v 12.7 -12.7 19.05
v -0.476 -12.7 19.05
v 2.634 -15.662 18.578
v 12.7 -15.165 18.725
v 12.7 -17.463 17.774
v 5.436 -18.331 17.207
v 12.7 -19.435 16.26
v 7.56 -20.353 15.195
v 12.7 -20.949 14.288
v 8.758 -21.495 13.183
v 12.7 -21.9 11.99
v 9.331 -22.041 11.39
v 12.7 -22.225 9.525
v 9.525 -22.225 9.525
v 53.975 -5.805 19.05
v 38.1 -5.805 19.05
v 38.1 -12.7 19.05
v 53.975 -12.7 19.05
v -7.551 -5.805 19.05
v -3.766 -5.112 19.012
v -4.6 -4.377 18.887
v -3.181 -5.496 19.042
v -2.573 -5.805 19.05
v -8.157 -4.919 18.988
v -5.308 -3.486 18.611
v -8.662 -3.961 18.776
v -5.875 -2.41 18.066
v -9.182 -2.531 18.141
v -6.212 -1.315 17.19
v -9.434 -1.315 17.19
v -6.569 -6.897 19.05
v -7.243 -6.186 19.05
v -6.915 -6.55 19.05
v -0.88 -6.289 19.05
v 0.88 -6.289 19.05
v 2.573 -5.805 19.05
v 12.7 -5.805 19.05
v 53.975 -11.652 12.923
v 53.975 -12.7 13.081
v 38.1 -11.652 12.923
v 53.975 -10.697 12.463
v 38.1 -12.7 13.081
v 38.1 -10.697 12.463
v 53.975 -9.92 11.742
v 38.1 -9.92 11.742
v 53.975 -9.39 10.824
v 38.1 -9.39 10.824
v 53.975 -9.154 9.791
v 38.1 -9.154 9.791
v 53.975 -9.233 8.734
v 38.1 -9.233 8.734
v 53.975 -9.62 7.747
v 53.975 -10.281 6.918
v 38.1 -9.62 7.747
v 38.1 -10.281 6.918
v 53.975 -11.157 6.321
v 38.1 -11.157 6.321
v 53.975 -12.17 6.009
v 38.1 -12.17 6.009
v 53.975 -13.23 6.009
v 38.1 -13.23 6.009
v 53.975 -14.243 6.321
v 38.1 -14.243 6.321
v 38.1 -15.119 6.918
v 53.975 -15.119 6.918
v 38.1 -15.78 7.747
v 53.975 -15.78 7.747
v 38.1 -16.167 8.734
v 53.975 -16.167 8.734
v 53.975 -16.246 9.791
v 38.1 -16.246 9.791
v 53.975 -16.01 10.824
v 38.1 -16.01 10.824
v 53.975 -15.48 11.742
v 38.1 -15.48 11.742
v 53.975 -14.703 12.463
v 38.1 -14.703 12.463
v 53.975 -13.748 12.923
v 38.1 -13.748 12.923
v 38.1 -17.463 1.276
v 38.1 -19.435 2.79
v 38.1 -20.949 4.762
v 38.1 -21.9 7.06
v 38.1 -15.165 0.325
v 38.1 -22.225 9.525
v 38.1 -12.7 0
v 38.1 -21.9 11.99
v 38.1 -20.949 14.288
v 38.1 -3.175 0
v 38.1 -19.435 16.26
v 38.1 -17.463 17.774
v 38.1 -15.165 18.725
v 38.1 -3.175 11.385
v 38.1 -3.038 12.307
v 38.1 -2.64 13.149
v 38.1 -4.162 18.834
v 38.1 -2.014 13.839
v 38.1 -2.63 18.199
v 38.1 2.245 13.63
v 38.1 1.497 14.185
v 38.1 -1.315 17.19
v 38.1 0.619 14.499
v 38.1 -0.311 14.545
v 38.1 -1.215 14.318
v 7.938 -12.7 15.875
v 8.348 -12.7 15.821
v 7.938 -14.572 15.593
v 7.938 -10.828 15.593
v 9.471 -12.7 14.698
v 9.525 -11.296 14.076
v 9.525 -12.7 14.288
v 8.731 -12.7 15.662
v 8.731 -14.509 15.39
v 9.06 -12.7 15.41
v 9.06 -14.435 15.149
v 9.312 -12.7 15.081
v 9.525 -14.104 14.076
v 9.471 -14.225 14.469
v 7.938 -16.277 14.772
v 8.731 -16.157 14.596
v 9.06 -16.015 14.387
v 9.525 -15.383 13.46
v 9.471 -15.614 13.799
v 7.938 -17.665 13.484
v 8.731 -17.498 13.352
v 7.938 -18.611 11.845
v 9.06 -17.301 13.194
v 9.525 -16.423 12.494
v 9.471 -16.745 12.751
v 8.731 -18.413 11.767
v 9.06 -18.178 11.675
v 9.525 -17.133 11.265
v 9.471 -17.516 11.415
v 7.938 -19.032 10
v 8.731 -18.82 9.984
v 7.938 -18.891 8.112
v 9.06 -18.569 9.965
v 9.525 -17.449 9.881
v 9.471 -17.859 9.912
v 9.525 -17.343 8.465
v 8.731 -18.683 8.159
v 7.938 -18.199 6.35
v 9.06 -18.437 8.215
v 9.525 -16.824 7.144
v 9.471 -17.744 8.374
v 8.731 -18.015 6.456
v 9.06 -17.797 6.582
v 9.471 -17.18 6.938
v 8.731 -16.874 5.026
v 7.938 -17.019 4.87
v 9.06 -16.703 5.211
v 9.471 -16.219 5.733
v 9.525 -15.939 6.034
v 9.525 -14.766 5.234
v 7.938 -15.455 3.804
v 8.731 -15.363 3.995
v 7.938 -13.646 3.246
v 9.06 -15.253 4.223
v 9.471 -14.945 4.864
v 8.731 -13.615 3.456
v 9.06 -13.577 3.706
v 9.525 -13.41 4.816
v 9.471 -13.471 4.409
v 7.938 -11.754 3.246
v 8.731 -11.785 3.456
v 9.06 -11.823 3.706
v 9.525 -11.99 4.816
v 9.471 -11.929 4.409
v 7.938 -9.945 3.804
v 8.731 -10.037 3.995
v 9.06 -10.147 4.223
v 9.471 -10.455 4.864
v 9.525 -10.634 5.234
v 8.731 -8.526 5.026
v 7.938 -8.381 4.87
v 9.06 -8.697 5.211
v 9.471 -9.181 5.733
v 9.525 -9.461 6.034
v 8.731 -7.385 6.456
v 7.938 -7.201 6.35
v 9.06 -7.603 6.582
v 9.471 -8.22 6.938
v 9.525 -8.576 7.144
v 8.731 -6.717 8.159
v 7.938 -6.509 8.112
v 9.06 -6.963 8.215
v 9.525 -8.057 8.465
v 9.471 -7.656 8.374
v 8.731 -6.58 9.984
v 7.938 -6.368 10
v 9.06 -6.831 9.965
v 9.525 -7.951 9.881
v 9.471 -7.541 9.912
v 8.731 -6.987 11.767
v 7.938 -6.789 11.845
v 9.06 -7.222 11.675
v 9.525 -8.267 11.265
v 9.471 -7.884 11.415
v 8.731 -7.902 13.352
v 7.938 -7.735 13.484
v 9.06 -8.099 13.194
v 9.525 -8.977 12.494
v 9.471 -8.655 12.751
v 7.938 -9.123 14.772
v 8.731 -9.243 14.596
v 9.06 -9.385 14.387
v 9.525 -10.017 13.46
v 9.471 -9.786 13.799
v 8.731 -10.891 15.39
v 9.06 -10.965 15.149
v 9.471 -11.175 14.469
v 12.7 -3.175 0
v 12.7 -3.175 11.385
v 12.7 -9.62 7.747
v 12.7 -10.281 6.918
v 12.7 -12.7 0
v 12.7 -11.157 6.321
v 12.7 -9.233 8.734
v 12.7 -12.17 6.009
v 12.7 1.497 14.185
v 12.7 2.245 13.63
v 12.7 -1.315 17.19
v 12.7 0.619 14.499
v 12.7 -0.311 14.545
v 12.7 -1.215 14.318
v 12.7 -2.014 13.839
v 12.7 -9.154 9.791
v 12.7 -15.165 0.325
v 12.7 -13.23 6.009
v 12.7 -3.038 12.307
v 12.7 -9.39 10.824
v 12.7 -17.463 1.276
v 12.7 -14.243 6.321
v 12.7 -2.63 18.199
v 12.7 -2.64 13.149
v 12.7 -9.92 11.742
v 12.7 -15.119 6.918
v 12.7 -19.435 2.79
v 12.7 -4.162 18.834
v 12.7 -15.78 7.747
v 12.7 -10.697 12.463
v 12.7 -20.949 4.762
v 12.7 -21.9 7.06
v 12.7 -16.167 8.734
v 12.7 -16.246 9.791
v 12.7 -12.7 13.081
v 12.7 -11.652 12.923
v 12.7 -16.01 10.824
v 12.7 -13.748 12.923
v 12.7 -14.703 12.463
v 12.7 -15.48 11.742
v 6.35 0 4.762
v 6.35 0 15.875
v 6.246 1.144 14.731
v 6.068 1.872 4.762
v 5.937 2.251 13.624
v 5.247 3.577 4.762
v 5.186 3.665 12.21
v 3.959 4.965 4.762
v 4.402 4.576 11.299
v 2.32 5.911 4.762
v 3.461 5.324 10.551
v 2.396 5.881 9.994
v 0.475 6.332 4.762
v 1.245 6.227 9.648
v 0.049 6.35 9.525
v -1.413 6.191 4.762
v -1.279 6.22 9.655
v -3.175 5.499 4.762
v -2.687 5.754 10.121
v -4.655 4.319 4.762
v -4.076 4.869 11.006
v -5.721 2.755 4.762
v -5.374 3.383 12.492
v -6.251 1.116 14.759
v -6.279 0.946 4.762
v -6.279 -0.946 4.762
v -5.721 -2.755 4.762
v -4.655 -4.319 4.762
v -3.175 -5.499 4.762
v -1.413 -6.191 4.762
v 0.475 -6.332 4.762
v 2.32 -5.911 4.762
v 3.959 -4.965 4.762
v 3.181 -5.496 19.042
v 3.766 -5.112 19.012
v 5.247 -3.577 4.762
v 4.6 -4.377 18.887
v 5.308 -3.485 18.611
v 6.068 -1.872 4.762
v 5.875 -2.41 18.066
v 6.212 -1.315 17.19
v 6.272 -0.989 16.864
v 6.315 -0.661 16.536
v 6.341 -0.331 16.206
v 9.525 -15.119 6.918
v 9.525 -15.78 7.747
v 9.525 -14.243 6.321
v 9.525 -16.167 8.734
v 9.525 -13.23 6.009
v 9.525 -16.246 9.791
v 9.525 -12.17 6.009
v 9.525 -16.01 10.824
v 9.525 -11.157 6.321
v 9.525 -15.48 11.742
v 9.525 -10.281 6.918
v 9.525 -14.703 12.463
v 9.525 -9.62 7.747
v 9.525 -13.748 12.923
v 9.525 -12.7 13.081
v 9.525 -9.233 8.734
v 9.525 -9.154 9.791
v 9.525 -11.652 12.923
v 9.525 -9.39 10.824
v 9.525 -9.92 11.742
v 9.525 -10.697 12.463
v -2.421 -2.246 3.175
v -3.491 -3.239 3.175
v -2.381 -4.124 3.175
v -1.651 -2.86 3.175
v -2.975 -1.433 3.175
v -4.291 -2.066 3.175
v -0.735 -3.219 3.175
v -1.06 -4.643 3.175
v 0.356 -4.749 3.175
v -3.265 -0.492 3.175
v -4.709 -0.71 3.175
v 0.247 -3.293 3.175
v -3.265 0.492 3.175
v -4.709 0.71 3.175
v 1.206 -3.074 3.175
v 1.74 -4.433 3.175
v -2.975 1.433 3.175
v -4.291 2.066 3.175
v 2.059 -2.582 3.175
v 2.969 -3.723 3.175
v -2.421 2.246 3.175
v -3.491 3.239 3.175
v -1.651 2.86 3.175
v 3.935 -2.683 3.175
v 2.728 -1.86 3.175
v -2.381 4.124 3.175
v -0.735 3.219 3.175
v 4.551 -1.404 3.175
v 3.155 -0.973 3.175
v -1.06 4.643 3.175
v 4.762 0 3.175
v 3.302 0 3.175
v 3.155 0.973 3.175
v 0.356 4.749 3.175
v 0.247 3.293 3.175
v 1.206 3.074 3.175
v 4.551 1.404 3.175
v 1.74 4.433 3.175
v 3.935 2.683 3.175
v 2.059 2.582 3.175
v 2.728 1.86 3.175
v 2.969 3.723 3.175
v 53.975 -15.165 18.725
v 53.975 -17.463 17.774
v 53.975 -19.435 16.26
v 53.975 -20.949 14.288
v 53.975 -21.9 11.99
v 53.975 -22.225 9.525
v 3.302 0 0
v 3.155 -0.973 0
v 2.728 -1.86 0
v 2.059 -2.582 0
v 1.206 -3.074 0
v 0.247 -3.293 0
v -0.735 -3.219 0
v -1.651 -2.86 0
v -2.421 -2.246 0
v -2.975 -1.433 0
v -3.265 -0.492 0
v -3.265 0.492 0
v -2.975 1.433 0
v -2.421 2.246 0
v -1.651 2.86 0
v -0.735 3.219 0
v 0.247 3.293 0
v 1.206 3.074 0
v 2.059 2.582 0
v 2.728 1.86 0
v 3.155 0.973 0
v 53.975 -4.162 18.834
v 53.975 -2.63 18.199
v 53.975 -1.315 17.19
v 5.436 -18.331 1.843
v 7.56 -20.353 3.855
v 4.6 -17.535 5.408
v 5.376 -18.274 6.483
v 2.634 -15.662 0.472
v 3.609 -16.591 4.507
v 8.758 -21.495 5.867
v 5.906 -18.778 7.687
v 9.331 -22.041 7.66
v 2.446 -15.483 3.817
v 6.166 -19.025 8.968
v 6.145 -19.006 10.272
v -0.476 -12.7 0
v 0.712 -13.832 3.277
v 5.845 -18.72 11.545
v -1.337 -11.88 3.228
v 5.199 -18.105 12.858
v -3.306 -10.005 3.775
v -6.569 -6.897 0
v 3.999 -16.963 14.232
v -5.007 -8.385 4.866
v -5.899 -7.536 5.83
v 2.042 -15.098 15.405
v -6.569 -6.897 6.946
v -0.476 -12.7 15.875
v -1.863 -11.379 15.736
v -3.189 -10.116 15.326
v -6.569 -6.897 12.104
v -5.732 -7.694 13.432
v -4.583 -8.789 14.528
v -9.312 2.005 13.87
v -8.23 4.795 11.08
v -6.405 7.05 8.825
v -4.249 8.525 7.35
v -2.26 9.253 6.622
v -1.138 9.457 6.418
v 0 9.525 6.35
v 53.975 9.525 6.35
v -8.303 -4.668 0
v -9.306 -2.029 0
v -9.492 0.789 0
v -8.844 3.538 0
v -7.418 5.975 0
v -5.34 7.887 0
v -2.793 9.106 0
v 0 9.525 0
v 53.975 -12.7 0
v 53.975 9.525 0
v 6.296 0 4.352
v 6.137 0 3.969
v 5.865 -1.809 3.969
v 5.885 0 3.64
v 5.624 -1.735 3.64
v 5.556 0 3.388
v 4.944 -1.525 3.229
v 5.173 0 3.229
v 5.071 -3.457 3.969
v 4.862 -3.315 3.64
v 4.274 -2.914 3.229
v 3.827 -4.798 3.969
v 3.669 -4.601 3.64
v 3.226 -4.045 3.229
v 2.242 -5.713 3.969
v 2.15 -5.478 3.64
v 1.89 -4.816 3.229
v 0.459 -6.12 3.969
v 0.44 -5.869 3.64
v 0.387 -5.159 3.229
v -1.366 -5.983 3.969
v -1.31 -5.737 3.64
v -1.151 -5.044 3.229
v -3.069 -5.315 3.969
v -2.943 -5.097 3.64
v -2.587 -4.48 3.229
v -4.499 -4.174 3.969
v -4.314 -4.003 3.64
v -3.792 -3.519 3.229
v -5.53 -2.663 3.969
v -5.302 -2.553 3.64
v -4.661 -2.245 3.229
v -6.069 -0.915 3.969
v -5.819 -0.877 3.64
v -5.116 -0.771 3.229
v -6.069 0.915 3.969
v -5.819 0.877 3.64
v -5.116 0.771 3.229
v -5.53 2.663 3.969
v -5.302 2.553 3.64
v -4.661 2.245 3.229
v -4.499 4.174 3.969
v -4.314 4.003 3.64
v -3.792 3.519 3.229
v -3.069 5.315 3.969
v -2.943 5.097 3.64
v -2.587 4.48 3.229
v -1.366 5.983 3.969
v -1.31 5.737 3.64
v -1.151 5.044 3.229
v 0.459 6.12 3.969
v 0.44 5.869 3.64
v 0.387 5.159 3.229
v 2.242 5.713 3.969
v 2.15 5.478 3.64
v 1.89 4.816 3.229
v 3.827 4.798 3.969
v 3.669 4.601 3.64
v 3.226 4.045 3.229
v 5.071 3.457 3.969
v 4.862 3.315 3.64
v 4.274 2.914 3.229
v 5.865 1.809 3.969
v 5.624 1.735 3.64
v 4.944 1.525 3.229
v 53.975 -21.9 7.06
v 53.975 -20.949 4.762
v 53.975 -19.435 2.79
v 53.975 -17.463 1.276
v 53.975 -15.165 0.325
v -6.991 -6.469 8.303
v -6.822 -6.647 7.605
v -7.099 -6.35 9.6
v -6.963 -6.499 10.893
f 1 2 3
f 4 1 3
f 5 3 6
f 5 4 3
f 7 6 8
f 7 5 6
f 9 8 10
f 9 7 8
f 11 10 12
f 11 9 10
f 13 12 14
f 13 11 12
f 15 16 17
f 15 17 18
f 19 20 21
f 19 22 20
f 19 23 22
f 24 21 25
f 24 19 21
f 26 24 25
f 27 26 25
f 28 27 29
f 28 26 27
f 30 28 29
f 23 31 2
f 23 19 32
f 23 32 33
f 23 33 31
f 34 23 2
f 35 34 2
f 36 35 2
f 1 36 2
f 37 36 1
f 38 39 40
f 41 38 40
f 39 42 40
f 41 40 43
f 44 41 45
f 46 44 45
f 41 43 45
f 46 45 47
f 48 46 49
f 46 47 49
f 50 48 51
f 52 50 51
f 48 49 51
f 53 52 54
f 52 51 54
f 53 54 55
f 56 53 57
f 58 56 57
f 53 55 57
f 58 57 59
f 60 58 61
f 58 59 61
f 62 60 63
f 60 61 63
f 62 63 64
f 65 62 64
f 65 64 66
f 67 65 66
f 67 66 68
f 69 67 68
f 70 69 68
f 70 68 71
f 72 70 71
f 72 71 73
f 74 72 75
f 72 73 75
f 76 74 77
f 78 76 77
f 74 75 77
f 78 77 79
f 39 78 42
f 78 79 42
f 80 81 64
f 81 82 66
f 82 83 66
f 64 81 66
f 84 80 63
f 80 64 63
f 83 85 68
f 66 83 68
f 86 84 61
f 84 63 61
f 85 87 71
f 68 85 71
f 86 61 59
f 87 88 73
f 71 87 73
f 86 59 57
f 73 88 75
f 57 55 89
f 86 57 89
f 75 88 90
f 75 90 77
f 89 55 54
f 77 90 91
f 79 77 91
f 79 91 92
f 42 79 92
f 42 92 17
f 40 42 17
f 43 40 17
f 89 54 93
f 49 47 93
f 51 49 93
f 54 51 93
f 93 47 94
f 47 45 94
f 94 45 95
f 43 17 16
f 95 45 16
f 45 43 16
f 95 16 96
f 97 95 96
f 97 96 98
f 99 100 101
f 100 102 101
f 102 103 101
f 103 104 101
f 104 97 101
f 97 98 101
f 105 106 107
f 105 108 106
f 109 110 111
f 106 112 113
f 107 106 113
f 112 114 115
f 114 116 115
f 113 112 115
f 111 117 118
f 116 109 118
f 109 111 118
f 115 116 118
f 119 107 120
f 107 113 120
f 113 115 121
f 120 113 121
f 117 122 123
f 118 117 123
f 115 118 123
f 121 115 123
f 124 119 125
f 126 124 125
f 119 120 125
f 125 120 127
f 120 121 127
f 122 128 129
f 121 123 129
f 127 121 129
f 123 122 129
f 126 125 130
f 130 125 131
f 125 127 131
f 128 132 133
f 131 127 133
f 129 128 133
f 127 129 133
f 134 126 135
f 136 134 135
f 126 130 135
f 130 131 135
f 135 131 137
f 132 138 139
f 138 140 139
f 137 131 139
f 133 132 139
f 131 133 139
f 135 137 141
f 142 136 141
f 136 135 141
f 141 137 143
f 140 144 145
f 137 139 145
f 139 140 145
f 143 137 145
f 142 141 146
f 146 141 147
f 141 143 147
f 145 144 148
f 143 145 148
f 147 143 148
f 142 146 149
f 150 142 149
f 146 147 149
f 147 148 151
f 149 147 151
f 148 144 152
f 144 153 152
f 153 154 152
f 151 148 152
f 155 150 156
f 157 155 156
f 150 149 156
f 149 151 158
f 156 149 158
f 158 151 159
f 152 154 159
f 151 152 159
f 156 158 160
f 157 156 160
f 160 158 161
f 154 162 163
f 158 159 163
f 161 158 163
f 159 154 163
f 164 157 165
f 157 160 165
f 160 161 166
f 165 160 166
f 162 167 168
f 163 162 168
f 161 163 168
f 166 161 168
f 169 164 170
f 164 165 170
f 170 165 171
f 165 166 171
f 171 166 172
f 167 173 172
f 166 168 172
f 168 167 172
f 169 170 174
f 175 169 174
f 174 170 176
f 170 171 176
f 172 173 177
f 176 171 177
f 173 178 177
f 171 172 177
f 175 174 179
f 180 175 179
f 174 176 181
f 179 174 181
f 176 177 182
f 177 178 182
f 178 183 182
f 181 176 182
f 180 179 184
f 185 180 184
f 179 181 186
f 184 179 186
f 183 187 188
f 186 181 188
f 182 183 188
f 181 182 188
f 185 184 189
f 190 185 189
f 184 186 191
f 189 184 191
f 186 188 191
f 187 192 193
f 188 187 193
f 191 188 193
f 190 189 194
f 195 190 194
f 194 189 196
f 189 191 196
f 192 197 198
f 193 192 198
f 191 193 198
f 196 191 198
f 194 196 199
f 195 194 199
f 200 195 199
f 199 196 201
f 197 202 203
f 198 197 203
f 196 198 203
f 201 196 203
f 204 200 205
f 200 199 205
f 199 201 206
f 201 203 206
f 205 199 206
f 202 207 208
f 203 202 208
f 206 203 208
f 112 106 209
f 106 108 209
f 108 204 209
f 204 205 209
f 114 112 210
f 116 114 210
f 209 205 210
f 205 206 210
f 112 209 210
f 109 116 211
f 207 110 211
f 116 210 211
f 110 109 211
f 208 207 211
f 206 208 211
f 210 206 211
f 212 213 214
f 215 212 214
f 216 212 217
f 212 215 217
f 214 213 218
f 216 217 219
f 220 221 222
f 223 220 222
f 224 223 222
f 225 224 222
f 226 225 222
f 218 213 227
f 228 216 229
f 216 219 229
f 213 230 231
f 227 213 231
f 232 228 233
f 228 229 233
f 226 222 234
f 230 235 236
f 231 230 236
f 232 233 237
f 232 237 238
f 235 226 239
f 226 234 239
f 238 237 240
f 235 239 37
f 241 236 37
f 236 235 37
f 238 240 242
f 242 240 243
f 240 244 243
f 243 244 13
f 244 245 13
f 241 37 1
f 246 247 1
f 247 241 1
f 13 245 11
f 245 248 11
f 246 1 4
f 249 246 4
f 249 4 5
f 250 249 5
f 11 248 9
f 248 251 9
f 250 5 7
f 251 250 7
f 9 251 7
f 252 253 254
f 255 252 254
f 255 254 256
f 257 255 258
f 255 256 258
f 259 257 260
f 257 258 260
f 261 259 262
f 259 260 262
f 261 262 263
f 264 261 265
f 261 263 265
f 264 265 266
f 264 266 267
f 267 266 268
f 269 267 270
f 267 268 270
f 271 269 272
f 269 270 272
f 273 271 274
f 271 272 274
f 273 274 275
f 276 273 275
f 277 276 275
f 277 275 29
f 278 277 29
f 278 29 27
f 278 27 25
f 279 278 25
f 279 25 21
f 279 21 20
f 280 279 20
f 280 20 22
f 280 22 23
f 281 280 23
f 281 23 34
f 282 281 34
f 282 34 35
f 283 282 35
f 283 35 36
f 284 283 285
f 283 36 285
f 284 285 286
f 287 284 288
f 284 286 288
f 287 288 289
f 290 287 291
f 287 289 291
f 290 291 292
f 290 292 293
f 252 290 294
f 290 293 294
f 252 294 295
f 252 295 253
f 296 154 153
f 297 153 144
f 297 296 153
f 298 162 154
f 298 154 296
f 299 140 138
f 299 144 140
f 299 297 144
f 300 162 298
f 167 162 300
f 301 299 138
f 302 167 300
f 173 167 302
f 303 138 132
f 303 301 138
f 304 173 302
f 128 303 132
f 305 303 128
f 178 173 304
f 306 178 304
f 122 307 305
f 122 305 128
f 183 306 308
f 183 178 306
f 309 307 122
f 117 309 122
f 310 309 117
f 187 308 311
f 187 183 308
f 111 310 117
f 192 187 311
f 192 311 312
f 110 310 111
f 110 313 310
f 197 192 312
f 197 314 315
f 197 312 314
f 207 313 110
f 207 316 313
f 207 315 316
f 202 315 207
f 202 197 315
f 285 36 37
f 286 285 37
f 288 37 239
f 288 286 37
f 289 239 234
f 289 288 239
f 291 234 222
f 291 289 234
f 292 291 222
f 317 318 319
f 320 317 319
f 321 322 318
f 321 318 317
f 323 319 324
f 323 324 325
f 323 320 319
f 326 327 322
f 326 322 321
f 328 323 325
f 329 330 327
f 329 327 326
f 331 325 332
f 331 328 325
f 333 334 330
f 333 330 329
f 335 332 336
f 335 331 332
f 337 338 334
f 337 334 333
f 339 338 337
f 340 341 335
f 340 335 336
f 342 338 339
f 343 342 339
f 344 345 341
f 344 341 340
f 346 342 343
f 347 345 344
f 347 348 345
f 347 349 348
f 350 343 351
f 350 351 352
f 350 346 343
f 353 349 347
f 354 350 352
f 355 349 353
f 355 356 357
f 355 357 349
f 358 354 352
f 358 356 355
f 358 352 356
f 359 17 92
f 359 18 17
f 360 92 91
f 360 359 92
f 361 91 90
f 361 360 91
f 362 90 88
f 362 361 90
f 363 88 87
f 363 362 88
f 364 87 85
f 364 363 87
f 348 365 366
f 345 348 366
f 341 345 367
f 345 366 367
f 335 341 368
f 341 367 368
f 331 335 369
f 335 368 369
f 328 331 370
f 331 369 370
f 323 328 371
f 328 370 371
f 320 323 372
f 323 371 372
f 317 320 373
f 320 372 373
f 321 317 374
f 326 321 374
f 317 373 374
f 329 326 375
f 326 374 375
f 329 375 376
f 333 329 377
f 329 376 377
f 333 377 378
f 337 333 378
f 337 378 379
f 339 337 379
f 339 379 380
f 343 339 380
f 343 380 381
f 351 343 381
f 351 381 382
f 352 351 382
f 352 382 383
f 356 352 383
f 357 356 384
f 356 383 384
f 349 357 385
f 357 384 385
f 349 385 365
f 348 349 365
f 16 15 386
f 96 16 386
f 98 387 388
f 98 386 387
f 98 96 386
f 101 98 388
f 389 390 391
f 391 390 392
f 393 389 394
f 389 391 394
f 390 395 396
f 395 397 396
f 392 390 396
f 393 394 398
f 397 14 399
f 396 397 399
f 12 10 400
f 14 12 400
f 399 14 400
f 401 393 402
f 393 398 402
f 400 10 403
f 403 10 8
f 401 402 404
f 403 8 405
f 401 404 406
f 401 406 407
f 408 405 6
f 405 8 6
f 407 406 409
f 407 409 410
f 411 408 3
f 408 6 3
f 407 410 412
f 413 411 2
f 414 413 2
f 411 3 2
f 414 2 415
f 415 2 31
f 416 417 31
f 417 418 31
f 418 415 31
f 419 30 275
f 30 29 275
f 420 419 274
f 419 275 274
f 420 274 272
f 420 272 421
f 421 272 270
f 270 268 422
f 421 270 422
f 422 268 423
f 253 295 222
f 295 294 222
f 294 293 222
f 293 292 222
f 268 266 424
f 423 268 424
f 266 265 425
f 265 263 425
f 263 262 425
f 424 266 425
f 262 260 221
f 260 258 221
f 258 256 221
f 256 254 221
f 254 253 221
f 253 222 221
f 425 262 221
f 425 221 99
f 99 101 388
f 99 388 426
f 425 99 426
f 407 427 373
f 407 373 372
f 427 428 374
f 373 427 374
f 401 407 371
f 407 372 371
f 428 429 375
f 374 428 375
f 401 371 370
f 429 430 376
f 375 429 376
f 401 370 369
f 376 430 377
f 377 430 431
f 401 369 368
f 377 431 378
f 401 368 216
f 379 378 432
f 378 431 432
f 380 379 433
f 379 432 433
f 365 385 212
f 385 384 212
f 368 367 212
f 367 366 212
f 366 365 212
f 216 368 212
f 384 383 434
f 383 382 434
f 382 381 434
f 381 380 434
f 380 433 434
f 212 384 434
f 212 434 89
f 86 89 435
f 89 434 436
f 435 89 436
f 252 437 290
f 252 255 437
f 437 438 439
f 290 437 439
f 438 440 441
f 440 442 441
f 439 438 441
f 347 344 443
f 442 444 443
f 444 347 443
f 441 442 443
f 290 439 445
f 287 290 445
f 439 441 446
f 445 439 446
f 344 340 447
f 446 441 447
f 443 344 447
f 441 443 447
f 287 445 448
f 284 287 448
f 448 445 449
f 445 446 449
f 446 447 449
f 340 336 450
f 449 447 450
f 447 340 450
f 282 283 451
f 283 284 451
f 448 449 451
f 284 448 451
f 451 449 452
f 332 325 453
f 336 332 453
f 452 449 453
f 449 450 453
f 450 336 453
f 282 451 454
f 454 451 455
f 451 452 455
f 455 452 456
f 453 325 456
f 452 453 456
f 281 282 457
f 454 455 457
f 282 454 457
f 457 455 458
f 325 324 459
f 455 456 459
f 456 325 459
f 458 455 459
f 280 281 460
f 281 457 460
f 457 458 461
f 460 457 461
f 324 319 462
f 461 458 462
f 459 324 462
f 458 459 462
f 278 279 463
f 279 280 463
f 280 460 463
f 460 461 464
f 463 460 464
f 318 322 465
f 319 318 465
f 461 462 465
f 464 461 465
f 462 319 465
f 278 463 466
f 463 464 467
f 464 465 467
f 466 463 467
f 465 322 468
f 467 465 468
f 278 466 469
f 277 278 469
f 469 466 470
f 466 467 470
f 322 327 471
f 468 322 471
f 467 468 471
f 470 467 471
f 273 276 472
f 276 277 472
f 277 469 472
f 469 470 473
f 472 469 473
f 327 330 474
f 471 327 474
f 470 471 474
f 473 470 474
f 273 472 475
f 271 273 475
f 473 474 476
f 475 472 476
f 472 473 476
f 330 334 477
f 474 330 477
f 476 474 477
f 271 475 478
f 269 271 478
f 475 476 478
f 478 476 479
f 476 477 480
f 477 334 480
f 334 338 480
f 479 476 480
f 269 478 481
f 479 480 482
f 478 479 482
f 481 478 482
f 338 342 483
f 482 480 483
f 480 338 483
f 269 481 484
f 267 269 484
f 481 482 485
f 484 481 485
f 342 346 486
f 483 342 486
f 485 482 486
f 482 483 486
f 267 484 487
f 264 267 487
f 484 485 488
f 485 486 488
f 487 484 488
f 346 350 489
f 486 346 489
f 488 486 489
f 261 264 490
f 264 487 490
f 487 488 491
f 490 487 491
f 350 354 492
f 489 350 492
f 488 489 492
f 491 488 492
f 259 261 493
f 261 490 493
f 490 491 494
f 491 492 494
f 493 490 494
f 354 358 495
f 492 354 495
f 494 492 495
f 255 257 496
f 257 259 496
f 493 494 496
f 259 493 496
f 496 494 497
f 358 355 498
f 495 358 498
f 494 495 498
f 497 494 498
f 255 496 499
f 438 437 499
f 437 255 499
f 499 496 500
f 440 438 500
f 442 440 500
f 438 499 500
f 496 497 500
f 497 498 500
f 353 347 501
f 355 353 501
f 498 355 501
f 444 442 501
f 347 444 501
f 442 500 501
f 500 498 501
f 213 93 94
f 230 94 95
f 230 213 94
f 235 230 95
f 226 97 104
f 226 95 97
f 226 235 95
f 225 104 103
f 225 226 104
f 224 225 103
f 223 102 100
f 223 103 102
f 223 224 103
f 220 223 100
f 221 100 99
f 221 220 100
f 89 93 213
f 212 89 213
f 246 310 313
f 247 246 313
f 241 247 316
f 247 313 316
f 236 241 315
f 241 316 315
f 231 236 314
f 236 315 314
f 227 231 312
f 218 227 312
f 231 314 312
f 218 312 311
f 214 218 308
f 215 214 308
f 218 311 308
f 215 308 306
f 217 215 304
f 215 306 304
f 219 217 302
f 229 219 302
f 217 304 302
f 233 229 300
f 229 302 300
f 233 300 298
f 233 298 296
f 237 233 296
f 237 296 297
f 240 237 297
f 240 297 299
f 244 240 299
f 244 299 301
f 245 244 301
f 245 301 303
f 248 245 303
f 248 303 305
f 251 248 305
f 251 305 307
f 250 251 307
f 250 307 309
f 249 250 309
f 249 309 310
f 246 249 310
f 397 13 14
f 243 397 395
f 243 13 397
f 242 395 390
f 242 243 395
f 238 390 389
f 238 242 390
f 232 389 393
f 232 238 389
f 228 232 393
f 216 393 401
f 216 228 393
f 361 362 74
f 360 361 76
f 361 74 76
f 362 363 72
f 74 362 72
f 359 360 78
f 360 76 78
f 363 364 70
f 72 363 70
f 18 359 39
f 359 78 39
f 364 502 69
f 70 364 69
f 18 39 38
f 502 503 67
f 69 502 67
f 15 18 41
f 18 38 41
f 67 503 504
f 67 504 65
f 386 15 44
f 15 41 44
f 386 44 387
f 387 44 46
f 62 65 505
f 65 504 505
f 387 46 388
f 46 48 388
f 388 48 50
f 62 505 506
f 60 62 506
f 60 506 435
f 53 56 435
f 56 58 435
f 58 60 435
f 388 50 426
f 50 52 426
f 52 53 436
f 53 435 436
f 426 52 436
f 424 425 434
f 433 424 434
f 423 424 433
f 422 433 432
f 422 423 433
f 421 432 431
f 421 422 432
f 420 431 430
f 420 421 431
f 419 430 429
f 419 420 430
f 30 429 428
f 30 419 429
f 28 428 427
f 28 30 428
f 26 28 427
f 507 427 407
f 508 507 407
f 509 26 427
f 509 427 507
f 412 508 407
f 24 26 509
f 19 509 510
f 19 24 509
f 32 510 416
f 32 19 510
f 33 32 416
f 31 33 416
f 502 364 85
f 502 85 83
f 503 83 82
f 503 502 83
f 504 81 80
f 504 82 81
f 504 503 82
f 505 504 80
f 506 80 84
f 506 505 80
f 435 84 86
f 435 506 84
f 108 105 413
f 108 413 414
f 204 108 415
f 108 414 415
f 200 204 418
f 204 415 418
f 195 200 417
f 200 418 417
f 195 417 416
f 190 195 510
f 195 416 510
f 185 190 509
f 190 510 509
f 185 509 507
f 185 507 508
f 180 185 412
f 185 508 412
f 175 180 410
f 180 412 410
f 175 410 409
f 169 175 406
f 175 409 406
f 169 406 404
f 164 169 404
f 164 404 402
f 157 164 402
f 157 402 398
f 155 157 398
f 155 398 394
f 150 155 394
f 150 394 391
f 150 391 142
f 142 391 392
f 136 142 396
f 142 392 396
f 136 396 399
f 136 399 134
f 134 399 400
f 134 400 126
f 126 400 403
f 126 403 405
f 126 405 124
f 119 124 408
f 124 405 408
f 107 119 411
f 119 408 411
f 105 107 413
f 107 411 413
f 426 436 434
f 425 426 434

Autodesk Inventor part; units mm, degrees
ref_plane "YZ Plane" through (0, 0, 0) normal (1, 0, 0) x (0, 1, 0)
ref_plane "XZ Plane" through (0, 0, 0) normal (0, 1, 0) x (-1, 0, 0)
ref_plane "XY Plane" through (0, 0, 0) normal (0, 0, 1) x (1, 0, 0)
sketch "Sketch18" plane through (0, 0, 0) normal (0, 0, 1) x (1, 0, 0)
  circle A0 centre (0, 0) radius 3.302
  circle A1 centre (0, 0) radius 9.525
  line L0 (-9.525, -22.225) -> (53.975, -22.225)
  line L1 (53.975, -22.225) -> (53.975, 9.525)
  line L2 (53.975, 9.525) -> (-9.525, 9.525)
  line L3 (-9.525, 9.525) -> (-9.525, -22.225)
  dimension "d100" = 6.604
  dimension "d101" = 19.05
  dimension "d102" = 63.5
  dimension "d103" = 31.75
extrude "Extrusion17" add sketch "Sketch18" along normal blind 19.05
sketch "Sketch19" plane through (-9.525, -22.225, 0) normal (-1, 0, 0) x (0, 0, 1)
  circle A0 centre (9.525, 9.525) radius 9.525 construction
  circle A1 centre (9.525, 9.525) radius 3.556
  line L0 (0, 31.75) -> (0, 0) projected
  line L1 (0, 0) -> (19.05, 0) projected
  point P0 (0, 22.225)
  dimension "d106" = 19.05
  dimension "d107" = 7.112
extrude "Extrusion18" cut sketch "Sketch19" against normal through all
sketch "Sketch20" plane through (0, 0, 19.05) normal (0, 0, 1) x (1, 0, 0)
  line L0 (12.7, -41.275) -> (38.1, -41.275)
  line L1 (38.1, -41.275) -> (38.1, -3.175)
  line L2 (38.1, -3.175) -> (12.7, -3.175)
  line L3 (12.7, -3.175) -> (12.7, -41.275)
  line L4 (-9.525, -22.225) -> (53.975, -22.225) projected
  line L5 (12.7, -41.275) -> (38.1, -3.175) construction
  line L6 (38.1, -41.275) -> (12.7, -3.175) construction
  circle A0 centre (0, 0) radius 3.302 projected
  point P0 (25.4, -22.225)
  point P1 (12.7, -22.225)
  point P2 (38.1, -22.225)
  dimension "d110" = 25.4
  dimension "d111" = 38.1
  dimension "d112" = 12.7
extrude "Extrusion19" cut sketch "Sketch20" against normal through all contours L3 L2 L1 L4
sketch "Sketch21" plane through (-9.525, -22.225, 0) normal (-1, 0, 0) x (0, 0, 1)
  circle A0 centre (9.525, 9.525) radius 3.556 projected
  circle A1 centre (9.525, 9.525) radius 6.35
  line L0 (3.175, -9.525) -> (15.875, -9.525)
  line L1 (15.875, -9.525) -> (15.875, 9.525)
  line L2 (15.875, 9.525) -> (3.175, 9.525) construction
  line L3 (3.175, 9.525) -> (3.175, -9.525)
  line L4 (19.05, 0) -> (0, 0) projected
  line L5 (3.175, -9.525) -> (15.875, 9.525) construction
  line L6 (15.875, -9.525) -> (3.175, 9.525) construction
  point P0 (0, 22.225)
  point P1 (9.525, 0)
  point P2 (3.175, 0)
  point P3 (15.875, 0)
  point P4 (3.175, 9.525)
  dimension "d115" = 12.7
extrude "Extrusion20" cut sketch "Sketch21" against normal blind 19.05 contours A1
sketch "Sketch22" plane through (0, 0, 19.05) normal (0, 0, 1) x (1, 0, 0)
  circle A0 centre (0, 0) radius 9.525
  line L0 (-9.525, 9.525) -> (-9.525, -22.225) projected
  line L1 (9.525, -22.225) -> (-9.525, -22.225) projected
  line L2 (9.525, -22.225) -> (-6.569, -6.8974)
  line L3 (12.7, -22.225) -> (12.7, -3.175) projected
  line L4 (53.975, 9.525) -> (-9.525, 9.525) projected
  point P0 (-9.525, 0)
  point P1 (0, 9.525)
  dimension "d118" = 3.175
extrude "Extrusion21" cut sketch "Sketch22" against normal through all contours L2 L1 L0 A0 | L0 L4 A0
fillet "Fillet12" radius 1.5875 1 edges at (9.525, -12.7, 3.175)
fillet "Fillet13" radius 9.525 4 edges at (11.1125, -22.225, 19.05) (11.1125, -22.225, 0) (46.0375, -22.225, 19.05) (46.0375, -22.225, 0)
sketch "Sketch25" plane through (53.975, 9.525, 19.05) normal (1, 0, 0) x (0, 0, -1)
  line L0 (0, -22.225) -> (0, -12.7) projected
  line L1 (0, -12.7) -> (12.7, 0)
  line L2 (19.05, 0) -> (0, 0) projected
  line L3 (0, -22.225) -> (0, 0) projected
  point P0 (19.05, -9.525)
  dimension "d131" = 6.35
extrude "Extrusion24" cut sketch "Sketch25" against normal through all
sketch "Sketch26" plane through (0, 0, 19.05) normal (0, 0, 1) x (1, 0, 0)
  circle A0 centre (0, 0) radius 6.35
  dimension "d134" = 12.7
extrude "Extrusion25" cut sketch "Sketch26" against normal blind 15.875
fillet "Fillet16" radius 3.175 1 edges at (25.4, -3.175, 19.05)
fillet "Fillet17" radius 6.35 3 edges at (9.0996, -3.175, 19.05) (-7.2398, -3.175, 19.05) (46.0375, -3.175, 19.05)
fillet "Fillet18" radius 1.5875 1 edges at (-6.35, 0, 3.175)
properties part number "Mod Mount" material "UHMW, White"
